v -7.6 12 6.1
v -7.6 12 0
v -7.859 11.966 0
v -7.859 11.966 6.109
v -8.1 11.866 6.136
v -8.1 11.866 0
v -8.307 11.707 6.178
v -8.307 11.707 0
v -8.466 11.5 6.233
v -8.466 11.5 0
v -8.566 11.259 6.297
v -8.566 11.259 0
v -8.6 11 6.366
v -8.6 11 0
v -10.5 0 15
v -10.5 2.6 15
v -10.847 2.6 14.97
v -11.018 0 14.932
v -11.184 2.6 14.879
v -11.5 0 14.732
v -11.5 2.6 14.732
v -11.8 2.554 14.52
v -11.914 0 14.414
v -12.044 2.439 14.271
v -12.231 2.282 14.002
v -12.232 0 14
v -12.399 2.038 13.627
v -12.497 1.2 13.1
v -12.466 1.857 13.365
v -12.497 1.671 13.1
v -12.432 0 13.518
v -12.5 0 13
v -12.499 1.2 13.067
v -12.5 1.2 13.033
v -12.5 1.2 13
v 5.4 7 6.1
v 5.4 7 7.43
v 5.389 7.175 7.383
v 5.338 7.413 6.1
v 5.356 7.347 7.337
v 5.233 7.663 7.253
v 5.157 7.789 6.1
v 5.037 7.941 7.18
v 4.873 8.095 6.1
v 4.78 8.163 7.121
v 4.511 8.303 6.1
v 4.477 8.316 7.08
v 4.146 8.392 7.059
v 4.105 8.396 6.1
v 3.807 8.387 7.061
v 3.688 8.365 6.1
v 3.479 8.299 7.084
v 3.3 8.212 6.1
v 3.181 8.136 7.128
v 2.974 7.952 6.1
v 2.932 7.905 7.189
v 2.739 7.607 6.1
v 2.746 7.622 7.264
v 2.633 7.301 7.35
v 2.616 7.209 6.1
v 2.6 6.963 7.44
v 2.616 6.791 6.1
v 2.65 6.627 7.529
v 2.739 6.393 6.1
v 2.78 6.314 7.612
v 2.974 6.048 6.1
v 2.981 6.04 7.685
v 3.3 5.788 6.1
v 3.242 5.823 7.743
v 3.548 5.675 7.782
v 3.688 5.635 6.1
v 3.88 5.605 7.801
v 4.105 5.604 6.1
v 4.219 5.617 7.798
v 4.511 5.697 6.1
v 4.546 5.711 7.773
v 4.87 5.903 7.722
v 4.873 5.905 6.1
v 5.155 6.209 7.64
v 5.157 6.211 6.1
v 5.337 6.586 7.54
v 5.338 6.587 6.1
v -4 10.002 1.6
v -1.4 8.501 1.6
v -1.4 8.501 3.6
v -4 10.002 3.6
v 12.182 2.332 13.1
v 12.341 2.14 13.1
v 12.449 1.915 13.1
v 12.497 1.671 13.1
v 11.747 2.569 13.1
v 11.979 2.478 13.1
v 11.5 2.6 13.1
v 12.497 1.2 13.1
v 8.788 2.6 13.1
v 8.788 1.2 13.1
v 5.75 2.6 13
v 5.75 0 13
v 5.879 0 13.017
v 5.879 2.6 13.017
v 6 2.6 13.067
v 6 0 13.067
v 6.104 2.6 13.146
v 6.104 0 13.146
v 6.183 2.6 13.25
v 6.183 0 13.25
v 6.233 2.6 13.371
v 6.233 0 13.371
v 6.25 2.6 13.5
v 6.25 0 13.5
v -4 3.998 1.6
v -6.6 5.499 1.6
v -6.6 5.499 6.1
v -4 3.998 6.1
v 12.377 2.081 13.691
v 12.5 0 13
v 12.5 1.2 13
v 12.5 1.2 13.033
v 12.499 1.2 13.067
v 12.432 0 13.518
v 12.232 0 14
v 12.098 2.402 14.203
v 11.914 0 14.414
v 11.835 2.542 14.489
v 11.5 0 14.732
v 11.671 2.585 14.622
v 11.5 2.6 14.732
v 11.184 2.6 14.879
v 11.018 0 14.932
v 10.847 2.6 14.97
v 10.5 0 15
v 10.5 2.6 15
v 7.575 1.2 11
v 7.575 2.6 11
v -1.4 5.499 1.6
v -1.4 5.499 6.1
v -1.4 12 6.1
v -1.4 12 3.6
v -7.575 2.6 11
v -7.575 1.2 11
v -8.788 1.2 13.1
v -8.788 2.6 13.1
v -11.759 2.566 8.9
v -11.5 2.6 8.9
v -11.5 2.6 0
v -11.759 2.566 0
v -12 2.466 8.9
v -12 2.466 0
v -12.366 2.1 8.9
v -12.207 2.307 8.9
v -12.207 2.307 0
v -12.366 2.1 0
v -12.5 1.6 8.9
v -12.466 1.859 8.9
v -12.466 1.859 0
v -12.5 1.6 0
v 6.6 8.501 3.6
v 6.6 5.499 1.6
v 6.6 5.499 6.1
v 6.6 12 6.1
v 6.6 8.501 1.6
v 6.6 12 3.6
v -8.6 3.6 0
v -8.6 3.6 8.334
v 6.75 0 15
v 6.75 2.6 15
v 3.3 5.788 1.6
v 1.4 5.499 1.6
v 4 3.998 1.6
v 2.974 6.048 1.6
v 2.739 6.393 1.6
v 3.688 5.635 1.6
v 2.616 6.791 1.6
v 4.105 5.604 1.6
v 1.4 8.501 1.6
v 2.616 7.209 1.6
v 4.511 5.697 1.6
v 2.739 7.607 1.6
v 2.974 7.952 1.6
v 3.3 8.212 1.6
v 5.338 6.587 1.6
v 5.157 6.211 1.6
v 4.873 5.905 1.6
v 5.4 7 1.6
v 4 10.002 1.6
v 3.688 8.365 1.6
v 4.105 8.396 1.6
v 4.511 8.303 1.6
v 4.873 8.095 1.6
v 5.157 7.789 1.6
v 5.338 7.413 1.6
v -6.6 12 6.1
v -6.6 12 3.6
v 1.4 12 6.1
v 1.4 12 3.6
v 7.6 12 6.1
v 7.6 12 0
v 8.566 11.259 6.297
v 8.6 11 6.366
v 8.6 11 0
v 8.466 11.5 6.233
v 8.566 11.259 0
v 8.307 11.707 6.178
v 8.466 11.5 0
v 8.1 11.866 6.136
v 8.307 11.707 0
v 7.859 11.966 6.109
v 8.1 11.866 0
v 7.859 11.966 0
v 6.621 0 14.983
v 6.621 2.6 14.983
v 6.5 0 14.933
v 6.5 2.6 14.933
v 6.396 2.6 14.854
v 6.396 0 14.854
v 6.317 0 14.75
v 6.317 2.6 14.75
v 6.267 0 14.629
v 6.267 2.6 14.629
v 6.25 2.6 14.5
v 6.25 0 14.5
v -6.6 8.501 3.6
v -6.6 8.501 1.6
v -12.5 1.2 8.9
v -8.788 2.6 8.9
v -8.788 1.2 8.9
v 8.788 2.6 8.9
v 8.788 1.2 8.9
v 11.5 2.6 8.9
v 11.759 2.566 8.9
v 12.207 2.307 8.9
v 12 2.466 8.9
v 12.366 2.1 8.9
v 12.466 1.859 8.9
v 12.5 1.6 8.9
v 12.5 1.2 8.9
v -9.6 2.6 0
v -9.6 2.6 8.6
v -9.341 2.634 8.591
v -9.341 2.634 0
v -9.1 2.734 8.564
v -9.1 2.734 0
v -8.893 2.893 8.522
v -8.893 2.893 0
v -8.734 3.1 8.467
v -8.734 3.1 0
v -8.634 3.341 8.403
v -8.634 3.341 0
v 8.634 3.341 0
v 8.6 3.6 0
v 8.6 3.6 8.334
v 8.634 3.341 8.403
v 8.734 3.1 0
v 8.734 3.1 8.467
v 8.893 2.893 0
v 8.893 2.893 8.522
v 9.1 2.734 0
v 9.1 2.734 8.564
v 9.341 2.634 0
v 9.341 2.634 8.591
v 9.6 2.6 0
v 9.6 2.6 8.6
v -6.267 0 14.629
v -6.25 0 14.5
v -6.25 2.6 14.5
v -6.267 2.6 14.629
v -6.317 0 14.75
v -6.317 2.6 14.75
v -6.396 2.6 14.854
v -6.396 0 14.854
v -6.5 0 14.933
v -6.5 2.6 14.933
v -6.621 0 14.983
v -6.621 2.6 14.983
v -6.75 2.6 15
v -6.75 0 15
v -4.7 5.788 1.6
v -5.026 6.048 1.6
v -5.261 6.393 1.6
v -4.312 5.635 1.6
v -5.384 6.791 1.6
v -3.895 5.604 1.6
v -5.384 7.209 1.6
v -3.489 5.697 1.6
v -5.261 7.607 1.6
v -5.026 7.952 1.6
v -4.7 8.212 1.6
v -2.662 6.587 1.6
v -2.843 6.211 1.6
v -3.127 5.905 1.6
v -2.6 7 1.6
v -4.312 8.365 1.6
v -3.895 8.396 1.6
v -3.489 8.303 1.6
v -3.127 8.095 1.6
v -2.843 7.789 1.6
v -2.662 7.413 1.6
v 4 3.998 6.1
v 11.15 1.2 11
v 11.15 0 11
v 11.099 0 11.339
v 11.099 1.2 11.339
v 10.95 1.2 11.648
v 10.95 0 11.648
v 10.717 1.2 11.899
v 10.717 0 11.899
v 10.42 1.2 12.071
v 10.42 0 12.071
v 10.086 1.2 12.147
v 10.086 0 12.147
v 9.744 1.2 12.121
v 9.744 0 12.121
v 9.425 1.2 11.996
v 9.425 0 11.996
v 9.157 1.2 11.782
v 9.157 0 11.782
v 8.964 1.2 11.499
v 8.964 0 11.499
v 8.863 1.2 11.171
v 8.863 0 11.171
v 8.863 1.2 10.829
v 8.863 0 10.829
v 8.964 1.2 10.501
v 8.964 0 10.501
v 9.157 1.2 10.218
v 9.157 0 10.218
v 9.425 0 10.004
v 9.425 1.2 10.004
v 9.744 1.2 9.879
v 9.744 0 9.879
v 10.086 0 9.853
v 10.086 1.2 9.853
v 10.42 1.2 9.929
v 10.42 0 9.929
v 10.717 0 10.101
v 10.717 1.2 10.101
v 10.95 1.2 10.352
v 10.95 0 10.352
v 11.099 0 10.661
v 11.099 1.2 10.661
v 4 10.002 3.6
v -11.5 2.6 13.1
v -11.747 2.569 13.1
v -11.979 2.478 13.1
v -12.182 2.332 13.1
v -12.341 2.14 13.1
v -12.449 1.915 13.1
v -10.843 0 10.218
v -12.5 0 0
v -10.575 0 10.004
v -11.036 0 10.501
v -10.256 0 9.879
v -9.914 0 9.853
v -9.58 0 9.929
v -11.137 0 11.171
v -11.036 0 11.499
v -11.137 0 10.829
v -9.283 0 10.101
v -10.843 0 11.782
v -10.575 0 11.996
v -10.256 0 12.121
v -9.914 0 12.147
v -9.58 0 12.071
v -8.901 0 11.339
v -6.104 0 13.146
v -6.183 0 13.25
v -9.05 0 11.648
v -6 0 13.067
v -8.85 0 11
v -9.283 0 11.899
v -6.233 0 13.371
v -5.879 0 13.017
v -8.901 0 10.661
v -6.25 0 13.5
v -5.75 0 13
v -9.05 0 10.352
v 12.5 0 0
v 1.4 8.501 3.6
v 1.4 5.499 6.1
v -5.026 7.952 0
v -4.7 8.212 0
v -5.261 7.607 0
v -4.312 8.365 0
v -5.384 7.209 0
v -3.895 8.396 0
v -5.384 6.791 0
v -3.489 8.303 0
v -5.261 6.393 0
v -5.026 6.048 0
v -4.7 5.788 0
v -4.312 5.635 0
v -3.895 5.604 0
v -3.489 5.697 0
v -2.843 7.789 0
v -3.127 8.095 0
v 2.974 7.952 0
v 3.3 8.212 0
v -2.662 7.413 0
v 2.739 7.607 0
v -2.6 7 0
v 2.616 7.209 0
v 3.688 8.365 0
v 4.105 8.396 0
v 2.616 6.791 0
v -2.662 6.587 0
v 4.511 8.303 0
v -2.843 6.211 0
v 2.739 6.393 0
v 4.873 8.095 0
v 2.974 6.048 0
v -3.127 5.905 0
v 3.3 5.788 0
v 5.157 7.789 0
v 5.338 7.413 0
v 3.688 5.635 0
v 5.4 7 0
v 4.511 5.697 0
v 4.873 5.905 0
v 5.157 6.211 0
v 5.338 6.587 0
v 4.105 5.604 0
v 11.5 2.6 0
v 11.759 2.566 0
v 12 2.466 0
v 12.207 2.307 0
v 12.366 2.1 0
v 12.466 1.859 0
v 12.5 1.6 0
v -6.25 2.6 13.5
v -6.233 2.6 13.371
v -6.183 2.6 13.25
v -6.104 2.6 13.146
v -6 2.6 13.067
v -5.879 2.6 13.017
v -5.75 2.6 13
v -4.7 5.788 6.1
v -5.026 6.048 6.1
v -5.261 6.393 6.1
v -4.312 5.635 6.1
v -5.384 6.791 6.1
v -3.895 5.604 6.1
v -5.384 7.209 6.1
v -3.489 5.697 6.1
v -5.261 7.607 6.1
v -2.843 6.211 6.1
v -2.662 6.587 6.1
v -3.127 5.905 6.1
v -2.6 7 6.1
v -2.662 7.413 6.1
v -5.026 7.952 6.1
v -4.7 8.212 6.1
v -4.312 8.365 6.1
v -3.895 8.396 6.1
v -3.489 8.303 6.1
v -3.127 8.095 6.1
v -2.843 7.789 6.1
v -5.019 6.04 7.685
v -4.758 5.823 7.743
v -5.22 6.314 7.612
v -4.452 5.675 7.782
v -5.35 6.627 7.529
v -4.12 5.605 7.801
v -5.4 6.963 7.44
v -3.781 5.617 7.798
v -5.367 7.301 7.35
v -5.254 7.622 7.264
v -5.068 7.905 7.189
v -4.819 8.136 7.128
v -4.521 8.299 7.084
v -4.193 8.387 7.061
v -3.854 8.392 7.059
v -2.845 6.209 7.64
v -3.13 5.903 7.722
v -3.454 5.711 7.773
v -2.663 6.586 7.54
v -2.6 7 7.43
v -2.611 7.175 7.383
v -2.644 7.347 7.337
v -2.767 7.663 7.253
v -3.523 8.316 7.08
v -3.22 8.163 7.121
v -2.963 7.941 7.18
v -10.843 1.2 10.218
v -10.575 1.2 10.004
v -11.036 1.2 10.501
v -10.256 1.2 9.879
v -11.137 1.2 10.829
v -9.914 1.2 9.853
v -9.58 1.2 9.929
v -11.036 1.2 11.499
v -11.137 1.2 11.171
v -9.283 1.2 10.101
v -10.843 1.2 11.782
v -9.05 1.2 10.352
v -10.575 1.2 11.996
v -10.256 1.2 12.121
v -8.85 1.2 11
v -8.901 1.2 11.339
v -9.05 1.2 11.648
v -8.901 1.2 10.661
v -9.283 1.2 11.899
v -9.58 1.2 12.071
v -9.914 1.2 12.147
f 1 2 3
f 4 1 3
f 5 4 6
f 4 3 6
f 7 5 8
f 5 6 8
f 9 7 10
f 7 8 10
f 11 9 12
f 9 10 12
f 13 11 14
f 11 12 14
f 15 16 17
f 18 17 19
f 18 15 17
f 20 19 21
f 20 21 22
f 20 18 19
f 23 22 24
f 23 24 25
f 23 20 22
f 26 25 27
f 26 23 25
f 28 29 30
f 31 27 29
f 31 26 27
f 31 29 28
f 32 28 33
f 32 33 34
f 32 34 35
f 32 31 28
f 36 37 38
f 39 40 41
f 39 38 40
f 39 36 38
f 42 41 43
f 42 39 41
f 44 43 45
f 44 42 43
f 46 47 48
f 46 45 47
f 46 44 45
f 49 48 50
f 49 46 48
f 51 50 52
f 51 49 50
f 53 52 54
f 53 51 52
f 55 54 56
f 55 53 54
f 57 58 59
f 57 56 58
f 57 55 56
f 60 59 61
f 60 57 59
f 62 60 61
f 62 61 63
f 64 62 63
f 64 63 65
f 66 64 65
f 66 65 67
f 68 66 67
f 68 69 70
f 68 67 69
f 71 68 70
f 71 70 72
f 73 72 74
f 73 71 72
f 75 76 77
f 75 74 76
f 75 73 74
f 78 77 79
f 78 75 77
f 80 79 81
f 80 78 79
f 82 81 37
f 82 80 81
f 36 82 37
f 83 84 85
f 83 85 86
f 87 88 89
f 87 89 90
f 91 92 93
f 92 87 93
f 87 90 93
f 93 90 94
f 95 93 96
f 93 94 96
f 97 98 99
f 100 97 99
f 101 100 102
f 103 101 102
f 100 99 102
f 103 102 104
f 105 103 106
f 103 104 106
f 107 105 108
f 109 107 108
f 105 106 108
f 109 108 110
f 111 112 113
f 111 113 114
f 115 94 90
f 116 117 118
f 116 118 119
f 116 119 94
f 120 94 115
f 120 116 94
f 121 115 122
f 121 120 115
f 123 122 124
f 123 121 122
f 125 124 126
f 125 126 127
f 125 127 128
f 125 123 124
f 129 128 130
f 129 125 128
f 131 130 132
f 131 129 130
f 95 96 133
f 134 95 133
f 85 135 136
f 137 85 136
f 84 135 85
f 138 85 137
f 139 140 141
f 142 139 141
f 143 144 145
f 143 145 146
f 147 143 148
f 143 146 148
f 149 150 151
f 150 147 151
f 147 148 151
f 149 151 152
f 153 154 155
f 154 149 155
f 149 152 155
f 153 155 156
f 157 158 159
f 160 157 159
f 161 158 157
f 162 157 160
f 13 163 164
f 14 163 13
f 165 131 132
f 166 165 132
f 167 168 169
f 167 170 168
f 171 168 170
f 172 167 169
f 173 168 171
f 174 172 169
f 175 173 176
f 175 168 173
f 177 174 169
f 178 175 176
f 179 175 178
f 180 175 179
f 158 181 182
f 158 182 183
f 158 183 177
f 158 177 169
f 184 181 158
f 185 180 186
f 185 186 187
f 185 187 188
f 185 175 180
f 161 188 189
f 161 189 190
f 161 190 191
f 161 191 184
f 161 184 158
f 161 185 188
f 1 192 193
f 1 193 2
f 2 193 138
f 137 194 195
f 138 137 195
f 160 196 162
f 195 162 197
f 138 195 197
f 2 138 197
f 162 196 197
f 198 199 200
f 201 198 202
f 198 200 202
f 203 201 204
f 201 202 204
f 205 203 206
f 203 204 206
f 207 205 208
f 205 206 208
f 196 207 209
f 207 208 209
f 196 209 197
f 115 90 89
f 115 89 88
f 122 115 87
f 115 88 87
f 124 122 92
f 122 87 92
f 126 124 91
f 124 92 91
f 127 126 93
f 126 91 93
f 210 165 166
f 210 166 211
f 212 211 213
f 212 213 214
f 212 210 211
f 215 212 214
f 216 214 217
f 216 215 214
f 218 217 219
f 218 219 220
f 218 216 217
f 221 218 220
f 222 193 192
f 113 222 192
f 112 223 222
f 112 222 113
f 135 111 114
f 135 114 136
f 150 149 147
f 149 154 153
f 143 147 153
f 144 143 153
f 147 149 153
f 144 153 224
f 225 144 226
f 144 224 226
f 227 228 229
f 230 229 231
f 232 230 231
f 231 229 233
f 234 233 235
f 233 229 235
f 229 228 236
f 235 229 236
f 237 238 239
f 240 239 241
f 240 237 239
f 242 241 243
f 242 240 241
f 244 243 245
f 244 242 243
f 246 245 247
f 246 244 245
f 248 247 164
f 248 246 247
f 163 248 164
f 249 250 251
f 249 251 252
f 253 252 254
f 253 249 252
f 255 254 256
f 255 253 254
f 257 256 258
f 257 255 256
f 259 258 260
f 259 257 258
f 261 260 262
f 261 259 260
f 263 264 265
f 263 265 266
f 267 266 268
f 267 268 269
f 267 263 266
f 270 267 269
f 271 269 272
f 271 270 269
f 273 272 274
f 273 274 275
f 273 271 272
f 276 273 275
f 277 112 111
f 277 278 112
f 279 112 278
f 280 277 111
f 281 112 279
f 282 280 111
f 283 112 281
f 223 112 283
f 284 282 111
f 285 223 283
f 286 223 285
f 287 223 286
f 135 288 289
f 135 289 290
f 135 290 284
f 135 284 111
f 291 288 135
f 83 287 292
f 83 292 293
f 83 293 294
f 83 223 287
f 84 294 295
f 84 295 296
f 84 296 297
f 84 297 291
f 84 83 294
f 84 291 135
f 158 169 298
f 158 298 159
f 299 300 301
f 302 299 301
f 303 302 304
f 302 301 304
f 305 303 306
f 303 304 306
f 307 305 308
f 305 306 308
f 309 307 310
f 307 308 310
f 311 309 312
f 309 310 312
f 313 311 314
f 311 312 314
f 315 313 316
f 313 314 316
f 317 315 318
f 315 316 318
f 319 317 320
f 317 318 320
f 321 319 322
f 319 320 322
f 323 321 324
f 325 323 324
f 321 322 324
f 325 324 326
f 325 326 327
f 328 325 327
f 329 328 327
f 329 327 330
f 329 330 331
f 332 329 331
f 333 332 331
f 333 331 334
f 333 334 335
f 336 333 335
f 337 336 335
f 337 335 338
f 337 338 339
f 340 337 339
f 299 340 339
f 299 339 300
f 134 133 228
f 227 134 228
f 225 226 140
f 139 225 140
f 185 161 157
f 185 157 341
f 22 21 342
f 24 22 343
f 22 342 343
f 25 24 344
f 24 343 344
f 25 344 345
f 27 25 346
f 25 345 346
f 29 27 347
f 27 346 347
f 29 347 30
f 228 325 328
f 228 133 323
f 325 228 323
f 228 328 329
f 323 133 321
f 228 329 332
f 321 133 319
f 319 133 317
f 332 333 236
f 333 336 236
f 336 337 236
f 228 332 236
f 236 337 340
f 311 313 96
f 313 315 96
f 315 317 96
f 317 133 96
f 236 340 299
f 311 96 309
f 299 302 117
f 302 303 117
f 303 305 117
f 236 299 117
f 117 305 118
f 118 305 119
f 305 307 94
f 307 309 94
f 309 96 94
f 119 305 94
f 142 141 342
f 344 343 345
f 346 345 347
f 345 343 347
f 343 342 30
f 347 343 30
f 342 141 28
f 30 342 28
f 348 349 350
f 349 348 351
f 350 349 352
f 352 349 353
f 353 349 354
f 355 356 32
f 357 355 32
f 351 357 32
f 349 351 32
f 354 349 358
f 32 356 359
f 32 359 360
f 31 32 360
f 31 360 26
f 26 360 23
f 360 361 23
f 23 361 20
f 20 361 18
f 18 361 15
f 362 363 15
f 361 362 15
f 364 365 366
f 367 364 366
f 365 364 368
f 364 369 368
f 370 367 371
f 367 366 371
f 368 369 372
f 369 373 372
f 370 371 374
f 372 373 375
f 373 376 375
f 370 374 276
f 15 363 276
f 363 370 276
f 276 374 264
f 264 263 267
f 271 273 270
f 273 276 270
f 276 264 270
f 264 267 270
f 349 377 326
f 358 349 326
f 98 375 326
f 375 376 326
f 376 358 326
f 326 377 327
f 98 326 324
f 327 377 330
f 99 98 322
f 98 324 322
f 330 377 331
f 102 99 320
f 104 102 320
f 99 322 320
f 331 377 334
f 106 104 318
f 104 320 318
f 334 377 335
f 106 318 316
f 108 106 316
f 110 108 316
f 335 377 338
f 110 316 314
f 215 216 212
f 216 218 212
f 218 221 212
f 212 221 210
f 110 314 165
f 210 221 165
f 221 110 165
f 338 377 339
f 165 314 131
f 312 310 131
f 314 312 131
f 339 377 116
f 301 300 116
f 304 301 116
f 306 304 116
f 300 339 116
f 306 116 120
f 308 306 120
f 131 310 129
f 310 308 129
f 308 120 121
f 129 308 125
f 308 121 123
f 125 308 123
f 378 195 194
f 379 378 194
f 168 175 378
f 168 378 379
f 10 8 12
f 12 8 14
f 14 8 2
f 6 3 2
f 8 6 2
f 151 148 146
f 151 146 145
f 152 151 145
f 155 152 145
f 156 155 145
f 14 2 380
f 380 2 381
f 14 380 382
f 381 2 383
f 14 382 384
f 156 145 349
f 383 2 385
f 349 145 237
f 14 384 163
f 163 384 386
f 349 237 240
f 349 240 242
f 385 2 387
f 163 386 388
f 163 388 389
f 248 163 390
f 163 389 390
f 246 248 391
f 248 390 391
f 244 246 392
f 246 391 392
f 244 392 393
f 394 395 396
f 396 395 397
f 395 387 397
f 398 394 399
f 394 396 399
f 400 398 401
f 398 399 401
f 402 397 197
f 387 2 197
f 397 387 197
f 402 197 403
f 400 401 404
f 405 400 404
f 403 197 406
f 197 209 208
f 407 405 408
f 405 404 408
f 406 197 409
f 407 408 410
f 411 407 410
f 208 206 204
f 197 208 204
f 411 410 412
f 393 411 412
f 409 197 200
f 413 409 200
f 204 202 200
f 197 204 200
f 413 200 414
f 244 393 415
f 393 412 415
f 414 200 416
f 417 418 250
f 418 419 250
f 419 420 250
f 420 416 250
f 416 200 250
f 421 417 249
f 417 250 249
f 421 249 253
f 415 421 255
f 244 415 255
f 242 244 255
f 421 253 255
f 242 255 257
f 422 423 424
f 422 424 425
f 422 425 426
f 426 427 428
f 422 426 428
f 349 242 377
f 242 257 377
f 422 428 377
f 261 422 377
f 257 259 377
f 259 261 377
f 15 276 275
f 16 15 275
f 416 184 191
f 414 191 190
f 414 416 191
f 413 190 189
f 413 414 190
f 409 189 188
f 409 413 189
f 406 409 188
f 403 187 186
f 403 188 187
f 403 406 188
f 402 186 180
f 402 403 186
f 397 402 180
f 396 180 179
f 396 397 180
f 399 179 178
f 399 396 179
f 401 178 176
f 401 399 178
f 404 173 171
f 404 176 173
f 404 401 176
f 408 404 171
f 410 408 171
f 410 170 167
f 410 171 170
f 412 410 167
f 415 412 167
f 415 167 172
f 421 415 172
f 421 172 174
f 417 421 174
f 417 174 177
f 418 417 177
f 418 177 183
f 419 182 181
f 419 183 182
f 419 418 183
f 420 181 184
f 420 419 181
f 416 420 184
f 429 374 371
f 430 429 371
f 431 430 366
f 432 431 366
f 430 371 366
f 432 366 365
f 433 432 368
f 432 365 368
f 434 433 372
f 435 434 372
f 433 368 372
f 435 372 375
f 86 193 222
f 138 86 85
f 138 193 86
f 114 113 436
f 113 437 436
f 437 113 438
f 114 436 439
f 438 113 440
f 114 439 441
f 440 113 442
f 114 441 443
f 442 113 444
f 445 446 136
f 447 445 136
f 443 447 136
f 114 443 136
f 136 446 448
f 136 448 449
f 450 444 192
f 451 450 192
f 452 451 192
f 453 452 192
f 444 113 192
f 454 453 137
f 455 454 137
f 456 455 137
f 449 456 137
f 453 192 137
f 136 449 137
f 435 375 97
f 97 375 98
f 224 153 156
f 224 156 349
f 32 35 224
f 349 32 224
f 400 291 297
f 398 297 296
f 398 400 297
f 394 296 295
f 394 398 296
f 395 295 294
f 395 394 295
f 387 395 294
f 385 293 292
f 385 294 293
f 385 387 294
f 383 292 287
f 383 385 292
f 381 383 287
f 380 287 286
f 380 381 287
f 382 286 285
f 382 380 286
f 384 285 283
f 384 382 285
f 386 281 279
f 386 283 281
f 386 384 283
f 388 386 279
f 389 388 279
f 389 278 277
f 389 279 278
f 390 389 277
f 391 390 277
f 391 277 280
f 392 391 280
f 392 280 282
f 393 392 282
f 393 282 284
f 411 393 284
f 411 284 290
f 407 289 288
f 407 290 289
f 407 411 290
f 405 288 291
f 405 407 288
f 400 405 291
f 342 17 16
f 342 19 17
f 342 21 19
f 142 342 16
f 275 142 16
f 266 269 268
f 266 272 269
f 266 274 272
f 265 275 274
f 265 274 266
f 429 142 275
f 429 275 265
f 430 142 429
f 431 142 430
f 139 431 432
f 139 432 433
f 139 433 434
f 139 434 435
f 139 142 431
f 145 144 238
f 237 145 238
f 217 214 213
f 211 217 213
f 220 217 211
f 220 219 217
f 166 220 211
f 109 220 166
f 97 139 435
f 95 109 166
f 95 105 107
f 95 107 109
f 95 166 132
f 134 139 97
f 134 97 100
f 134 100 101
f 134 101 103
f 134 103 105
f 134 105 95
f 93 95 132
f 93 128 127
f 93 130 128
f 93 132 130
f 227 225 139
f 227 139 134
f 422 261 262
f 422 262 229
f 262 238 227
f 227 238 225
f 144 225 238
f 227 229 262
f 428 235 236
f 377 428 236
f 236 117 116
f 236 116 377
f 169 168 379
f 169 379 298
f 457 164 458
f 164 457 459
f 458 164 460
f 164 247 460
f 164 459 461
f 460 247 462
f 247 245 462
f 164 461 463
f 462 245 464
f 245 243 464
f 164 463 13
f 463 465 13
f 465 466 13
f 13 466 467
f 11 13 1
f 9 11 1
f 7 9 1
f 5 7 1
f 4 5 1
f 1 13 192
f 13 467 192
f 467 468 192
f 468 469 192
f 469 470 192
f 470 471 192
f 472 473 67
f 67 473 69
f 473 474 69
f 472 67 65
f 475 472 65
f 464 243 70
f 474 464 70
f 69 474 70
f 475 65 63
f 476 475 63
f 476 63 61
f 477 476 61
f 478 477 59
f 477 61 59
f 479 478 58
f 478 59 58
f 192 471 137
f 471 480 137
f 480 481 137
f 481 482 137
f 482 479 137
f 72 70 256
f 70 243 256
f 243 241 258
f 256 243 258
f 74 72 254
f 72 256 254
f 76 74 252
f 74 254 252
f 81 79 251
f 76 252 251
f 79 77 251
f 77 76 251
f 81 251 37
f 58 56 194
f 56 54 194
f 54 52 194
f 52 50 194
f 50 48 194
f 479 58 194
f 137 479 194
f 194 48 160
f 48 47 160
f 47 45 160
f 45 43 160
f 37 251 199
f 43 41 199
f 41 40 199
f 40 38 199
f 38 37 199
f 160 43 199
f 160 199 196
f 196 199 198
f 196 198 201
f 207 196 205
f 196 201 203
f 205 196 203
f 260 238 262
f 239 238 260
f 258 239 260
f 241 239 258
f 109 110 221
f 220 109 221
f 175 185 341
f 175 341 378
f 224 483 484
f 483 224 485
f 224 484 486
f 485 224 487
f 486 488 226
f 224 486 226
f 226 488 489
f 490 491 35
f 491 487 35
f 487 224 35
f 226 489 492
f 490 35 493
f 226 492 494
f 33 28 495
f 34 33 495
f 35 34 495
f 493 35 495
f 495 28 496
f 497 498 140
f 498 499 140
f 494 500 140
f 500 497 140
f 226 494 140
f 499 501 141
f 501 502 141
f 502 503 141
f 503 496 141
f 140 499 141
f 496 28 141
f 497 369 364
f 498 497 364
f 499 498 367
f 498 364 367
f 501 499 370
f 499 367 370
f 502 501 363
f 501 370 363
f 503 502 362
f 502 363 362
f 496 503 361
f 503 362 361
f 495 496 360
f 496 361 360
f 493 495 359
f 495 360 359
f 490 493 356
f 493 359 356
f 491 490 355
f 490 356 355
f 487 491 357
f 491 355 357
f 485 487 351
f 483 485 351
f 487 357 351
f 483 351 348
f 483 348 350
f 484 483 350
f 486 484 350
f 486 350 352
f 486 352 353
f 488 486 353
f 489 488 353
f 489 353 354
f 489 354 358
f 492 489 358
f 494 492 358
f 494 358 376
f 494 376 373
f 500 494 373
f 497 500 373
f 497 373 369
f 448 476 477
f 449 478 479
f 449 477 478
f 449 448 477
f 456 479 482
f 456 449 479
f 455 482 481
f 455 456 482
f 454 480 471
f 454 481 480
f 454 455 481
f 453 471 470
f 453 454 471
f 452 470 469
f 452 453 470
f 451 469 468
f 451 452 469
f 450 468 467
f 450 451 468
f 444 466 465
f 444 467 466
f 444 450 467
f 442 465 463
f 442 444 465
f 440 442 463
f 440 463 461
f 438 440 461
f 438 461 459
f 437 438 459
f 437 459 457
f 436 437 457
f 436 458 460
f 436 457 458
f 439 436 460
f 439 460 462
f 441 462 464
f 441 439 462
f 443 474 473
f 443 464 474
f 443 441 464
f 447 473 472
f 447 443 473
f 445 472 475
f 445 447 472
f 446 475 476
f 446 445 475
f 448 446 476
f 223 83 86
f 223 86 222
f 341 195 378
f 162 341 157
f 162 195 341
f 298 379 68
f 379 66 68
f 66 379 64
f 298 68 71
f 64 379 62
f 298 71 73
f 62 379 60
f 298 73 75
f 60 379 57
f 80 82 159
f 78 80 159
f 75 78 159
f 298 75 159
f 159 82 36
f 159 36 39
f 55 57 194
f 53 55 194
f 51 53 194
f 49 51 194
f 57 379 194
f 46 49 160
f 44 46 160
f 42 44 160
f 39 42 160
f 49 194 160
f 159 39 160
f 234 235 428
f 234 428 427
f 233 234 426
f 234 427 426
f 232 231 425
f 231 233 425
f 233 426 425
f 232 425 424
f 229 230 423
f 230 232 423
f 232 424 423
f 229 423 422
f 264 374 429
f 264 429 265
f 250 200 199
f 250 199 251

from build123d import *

# Parameters (mm, degrees)
PAD010_DEPTH    = 12.5
SKETCH018_R     = 1.4
POCKET006_DEPTH = 15.001
POCKET007_DEPTH = 2
POCKET008_DEPTH = 2.5
POCKET009_DEPTH = 15.001
SKETCH023_R     = 1.15
POCKET010_DEPTH = 12.001
POCKET011_DEPTH = 10.801
POCKET012_DEPTH = 12.001


with BuildPart() as part:
    # Sketch016 → Pad010 (new body, symmetric)
    with BuildSketch(Plane.YZ):
        Polygon((0, 0), (0, 15), (2.6, 15), (2.6, 8.6), (12, 6.1), (12, 0), align=None)
    extrude(amount=PAD010_DEPTH, both=True)

    # Sketch018 → Pocket006 (cut, through all)
    with BuildSketch(Plane.XY):
        with Locations((-4, 7)):
            Circle(SKETCH018_R)
        with Locations((4, 7)):
            Circle(SKETCH018_R)
    extrude(amount=POCKET006_DEPTH, mode=Mode.SUBTRACT)

    # Sketch019 (on DatumPlane) → Pocket007 (cut)
    with BuildSketch(Plane.XY.offset(1.6)):
        Polygon((-4, 10.002221), (-6.6, 8.501111), (-6.6, 5.498889), (-4, 3.997779), (-1.4, 5.498889), (-1.4, 8.501111), align=None)
        Polygon((4, 10.002221), (1.4, 8.501111), (1.4, 5.498889), (4, 3.997779), (6.6, 5.498889), (6.6, 8.501111), align=None)
    extrude(amount=POCKET007_DEPTH, mode=Mode.SUBTRACT)

    # Sketch020 (on DatumPlane) → Pocket008 (cut)
    with BuildSketch(Plane.XY.offset(3.6)):
        Polygon((-4, 3.997779), (-1.4, 5.498889), (-1.4, 8.501111), (-1.4, 20.501111), (-6.6, 20.501111), (-6.6, 8.501111), (-6.6, 5.498889), align=None)
        Polygon((4, 3.997779), (6.6, 5.498889), (6.6, 8.501111), (6.6, 20.501111), (1.4, 20.501111), (1.4, 8.501111), (1.4, 5.498889), align=None)
    extrude(amount=POCKET008_DEPTH, mode=Mode.SUBTRACT)

    # Sketch021 → Pocket009 (cut, through all)
    with BuildSketch(Plane.XY):
        with BuildLine():
            Line((-12.5, 0), (-12.5, 1.6))
            ThreePointArc((-11.5, 2.6), (-12.207107, 2.307107), (-12.5, 1.6))
            Line((-11.5, 2.6), (-9.6, 2.6))
            ThreePointArc((-9.6, 2.6), (-8.892893, 2.892893), (-8.6, 3.6))
            Line((-8.6, 3.6), (-8.6, 11))
            ThreePointArc((-7.6, 12), (-8.307107, 11.707107), (-8.6, 11))
            Line((-7.6, 12), (7.6, 12))
            ThreePointArc((8.6, 11), (8.307107, 11.707107), (7.6, 12))
            Line((8.6, 11), (8.6, 3.6))
            ThreePointArc((8.6, 3.6), (8.892893, 2.892893), (9.6, 2.6))
            Line((9.6, 2.6), (11.5, 2.6))
            ThreePointArc((12.5, 1.6), (12.207107, 2.307107), (11.5, 2.6))
            Line((12.5, 1.6), (12.5, 0))
            Line((12.5, 0), (22.5, 0))
            Line((22.5, 0), (22.5, 22))
            Line((22.5, 22), (-22.5, 22))
            Line((-22.5, 22), (-22.5, 0))
            Line((-12.5, 0), (-22.5, 0))
        make_face()
    extrude(amount=POCKET009_DEPTH, mode=Mode.SUBTRACT)

    # Sketch023 → Pocket010 (cut, through all)
    with BuildSketch(Plane.XZ):
        with Locations((-10, 11)):
            Circle(SKETCH023_R)
        with Locations((10, 11)):
            Circle(SKETCH023_R)
    extrude(amount=-POCKET010_DEPTH, mode=Mode.SUBTRACT)

    # Sketch024 (on DatumPlane) → Pocket011 (cut, through all)
    with BuildSketch(Plane.XZ.offset(-1.2)):
        Polygon((7.575129, 11), (8.787564, 8.9), (11.212436, 8.9), (21.212436, 8.9), (21.212436, 13.1), (11.212436, 13.1), (8.787564, 13.1), align=None)
        Polygon((-7.575129, 11), (-8.787564, 13.1), (-11.212436, 13.1), (-21.212436, 13.1), (-21.212436, 8.9), (-11.212436, 8.9), (-8.787564, 8.9), align=None)
    extrude(amount=-POCKET011_DEPTH, mode=Mode.SUBTRACT)

    # Sketch025 → Pocket012 (cut, through all)
    with BuildSketch(Plane.XZ):
        with BuildLine():
            Line((-12.5, 0), (-12.5, 13))
            ThreePointArc((-10.5, 15), (-11.914214, 14.414214), (-12.5, 13))
            Line((-6.75, 15), (-10.5, 15))
            ThreePointArc((-6.25, 14.5), (-6.396447, 14.853553), (-6.75, 15))
            Line((-6.25, 13.5), (-6.25, 14.5))
            ThreePointArc((-6.25, 13.5), (-6.103553, 13.146447), (-5.75, 13))
            Line((-5.75, 13), (5.75, 13))
            ThreePointArc((5.75, 13), (6.103553, 13.146447), (6.25, 13.5))
            Line((6.25, 13.5), (6.25, 14.5))
            ThreePointArc((6.75, 15), (6.396447, 14.853553), (6.25, 14.5))
            Line((6.75, 15), (10.5, 15))
            ThreePointArc((12.5, 13), (11.914214, 14.414214), (10.5, 15))
            Line((12.5, 13), (12.5, 0))
            Line((12.5, 0), (17.5, 0))
            Line((17.5, 0), (17.5, 20))
            Line((17.5, 20), (-17.5, 20))
            Line((-17.5, 20), (-17.5, 0))
            Line((-17.5, 0), (-12.5, 0))
        make_face()
    extrude(amount=-POCKET012_DEPTH, mode=Mode.SUBTRACT)


solid = part.part
